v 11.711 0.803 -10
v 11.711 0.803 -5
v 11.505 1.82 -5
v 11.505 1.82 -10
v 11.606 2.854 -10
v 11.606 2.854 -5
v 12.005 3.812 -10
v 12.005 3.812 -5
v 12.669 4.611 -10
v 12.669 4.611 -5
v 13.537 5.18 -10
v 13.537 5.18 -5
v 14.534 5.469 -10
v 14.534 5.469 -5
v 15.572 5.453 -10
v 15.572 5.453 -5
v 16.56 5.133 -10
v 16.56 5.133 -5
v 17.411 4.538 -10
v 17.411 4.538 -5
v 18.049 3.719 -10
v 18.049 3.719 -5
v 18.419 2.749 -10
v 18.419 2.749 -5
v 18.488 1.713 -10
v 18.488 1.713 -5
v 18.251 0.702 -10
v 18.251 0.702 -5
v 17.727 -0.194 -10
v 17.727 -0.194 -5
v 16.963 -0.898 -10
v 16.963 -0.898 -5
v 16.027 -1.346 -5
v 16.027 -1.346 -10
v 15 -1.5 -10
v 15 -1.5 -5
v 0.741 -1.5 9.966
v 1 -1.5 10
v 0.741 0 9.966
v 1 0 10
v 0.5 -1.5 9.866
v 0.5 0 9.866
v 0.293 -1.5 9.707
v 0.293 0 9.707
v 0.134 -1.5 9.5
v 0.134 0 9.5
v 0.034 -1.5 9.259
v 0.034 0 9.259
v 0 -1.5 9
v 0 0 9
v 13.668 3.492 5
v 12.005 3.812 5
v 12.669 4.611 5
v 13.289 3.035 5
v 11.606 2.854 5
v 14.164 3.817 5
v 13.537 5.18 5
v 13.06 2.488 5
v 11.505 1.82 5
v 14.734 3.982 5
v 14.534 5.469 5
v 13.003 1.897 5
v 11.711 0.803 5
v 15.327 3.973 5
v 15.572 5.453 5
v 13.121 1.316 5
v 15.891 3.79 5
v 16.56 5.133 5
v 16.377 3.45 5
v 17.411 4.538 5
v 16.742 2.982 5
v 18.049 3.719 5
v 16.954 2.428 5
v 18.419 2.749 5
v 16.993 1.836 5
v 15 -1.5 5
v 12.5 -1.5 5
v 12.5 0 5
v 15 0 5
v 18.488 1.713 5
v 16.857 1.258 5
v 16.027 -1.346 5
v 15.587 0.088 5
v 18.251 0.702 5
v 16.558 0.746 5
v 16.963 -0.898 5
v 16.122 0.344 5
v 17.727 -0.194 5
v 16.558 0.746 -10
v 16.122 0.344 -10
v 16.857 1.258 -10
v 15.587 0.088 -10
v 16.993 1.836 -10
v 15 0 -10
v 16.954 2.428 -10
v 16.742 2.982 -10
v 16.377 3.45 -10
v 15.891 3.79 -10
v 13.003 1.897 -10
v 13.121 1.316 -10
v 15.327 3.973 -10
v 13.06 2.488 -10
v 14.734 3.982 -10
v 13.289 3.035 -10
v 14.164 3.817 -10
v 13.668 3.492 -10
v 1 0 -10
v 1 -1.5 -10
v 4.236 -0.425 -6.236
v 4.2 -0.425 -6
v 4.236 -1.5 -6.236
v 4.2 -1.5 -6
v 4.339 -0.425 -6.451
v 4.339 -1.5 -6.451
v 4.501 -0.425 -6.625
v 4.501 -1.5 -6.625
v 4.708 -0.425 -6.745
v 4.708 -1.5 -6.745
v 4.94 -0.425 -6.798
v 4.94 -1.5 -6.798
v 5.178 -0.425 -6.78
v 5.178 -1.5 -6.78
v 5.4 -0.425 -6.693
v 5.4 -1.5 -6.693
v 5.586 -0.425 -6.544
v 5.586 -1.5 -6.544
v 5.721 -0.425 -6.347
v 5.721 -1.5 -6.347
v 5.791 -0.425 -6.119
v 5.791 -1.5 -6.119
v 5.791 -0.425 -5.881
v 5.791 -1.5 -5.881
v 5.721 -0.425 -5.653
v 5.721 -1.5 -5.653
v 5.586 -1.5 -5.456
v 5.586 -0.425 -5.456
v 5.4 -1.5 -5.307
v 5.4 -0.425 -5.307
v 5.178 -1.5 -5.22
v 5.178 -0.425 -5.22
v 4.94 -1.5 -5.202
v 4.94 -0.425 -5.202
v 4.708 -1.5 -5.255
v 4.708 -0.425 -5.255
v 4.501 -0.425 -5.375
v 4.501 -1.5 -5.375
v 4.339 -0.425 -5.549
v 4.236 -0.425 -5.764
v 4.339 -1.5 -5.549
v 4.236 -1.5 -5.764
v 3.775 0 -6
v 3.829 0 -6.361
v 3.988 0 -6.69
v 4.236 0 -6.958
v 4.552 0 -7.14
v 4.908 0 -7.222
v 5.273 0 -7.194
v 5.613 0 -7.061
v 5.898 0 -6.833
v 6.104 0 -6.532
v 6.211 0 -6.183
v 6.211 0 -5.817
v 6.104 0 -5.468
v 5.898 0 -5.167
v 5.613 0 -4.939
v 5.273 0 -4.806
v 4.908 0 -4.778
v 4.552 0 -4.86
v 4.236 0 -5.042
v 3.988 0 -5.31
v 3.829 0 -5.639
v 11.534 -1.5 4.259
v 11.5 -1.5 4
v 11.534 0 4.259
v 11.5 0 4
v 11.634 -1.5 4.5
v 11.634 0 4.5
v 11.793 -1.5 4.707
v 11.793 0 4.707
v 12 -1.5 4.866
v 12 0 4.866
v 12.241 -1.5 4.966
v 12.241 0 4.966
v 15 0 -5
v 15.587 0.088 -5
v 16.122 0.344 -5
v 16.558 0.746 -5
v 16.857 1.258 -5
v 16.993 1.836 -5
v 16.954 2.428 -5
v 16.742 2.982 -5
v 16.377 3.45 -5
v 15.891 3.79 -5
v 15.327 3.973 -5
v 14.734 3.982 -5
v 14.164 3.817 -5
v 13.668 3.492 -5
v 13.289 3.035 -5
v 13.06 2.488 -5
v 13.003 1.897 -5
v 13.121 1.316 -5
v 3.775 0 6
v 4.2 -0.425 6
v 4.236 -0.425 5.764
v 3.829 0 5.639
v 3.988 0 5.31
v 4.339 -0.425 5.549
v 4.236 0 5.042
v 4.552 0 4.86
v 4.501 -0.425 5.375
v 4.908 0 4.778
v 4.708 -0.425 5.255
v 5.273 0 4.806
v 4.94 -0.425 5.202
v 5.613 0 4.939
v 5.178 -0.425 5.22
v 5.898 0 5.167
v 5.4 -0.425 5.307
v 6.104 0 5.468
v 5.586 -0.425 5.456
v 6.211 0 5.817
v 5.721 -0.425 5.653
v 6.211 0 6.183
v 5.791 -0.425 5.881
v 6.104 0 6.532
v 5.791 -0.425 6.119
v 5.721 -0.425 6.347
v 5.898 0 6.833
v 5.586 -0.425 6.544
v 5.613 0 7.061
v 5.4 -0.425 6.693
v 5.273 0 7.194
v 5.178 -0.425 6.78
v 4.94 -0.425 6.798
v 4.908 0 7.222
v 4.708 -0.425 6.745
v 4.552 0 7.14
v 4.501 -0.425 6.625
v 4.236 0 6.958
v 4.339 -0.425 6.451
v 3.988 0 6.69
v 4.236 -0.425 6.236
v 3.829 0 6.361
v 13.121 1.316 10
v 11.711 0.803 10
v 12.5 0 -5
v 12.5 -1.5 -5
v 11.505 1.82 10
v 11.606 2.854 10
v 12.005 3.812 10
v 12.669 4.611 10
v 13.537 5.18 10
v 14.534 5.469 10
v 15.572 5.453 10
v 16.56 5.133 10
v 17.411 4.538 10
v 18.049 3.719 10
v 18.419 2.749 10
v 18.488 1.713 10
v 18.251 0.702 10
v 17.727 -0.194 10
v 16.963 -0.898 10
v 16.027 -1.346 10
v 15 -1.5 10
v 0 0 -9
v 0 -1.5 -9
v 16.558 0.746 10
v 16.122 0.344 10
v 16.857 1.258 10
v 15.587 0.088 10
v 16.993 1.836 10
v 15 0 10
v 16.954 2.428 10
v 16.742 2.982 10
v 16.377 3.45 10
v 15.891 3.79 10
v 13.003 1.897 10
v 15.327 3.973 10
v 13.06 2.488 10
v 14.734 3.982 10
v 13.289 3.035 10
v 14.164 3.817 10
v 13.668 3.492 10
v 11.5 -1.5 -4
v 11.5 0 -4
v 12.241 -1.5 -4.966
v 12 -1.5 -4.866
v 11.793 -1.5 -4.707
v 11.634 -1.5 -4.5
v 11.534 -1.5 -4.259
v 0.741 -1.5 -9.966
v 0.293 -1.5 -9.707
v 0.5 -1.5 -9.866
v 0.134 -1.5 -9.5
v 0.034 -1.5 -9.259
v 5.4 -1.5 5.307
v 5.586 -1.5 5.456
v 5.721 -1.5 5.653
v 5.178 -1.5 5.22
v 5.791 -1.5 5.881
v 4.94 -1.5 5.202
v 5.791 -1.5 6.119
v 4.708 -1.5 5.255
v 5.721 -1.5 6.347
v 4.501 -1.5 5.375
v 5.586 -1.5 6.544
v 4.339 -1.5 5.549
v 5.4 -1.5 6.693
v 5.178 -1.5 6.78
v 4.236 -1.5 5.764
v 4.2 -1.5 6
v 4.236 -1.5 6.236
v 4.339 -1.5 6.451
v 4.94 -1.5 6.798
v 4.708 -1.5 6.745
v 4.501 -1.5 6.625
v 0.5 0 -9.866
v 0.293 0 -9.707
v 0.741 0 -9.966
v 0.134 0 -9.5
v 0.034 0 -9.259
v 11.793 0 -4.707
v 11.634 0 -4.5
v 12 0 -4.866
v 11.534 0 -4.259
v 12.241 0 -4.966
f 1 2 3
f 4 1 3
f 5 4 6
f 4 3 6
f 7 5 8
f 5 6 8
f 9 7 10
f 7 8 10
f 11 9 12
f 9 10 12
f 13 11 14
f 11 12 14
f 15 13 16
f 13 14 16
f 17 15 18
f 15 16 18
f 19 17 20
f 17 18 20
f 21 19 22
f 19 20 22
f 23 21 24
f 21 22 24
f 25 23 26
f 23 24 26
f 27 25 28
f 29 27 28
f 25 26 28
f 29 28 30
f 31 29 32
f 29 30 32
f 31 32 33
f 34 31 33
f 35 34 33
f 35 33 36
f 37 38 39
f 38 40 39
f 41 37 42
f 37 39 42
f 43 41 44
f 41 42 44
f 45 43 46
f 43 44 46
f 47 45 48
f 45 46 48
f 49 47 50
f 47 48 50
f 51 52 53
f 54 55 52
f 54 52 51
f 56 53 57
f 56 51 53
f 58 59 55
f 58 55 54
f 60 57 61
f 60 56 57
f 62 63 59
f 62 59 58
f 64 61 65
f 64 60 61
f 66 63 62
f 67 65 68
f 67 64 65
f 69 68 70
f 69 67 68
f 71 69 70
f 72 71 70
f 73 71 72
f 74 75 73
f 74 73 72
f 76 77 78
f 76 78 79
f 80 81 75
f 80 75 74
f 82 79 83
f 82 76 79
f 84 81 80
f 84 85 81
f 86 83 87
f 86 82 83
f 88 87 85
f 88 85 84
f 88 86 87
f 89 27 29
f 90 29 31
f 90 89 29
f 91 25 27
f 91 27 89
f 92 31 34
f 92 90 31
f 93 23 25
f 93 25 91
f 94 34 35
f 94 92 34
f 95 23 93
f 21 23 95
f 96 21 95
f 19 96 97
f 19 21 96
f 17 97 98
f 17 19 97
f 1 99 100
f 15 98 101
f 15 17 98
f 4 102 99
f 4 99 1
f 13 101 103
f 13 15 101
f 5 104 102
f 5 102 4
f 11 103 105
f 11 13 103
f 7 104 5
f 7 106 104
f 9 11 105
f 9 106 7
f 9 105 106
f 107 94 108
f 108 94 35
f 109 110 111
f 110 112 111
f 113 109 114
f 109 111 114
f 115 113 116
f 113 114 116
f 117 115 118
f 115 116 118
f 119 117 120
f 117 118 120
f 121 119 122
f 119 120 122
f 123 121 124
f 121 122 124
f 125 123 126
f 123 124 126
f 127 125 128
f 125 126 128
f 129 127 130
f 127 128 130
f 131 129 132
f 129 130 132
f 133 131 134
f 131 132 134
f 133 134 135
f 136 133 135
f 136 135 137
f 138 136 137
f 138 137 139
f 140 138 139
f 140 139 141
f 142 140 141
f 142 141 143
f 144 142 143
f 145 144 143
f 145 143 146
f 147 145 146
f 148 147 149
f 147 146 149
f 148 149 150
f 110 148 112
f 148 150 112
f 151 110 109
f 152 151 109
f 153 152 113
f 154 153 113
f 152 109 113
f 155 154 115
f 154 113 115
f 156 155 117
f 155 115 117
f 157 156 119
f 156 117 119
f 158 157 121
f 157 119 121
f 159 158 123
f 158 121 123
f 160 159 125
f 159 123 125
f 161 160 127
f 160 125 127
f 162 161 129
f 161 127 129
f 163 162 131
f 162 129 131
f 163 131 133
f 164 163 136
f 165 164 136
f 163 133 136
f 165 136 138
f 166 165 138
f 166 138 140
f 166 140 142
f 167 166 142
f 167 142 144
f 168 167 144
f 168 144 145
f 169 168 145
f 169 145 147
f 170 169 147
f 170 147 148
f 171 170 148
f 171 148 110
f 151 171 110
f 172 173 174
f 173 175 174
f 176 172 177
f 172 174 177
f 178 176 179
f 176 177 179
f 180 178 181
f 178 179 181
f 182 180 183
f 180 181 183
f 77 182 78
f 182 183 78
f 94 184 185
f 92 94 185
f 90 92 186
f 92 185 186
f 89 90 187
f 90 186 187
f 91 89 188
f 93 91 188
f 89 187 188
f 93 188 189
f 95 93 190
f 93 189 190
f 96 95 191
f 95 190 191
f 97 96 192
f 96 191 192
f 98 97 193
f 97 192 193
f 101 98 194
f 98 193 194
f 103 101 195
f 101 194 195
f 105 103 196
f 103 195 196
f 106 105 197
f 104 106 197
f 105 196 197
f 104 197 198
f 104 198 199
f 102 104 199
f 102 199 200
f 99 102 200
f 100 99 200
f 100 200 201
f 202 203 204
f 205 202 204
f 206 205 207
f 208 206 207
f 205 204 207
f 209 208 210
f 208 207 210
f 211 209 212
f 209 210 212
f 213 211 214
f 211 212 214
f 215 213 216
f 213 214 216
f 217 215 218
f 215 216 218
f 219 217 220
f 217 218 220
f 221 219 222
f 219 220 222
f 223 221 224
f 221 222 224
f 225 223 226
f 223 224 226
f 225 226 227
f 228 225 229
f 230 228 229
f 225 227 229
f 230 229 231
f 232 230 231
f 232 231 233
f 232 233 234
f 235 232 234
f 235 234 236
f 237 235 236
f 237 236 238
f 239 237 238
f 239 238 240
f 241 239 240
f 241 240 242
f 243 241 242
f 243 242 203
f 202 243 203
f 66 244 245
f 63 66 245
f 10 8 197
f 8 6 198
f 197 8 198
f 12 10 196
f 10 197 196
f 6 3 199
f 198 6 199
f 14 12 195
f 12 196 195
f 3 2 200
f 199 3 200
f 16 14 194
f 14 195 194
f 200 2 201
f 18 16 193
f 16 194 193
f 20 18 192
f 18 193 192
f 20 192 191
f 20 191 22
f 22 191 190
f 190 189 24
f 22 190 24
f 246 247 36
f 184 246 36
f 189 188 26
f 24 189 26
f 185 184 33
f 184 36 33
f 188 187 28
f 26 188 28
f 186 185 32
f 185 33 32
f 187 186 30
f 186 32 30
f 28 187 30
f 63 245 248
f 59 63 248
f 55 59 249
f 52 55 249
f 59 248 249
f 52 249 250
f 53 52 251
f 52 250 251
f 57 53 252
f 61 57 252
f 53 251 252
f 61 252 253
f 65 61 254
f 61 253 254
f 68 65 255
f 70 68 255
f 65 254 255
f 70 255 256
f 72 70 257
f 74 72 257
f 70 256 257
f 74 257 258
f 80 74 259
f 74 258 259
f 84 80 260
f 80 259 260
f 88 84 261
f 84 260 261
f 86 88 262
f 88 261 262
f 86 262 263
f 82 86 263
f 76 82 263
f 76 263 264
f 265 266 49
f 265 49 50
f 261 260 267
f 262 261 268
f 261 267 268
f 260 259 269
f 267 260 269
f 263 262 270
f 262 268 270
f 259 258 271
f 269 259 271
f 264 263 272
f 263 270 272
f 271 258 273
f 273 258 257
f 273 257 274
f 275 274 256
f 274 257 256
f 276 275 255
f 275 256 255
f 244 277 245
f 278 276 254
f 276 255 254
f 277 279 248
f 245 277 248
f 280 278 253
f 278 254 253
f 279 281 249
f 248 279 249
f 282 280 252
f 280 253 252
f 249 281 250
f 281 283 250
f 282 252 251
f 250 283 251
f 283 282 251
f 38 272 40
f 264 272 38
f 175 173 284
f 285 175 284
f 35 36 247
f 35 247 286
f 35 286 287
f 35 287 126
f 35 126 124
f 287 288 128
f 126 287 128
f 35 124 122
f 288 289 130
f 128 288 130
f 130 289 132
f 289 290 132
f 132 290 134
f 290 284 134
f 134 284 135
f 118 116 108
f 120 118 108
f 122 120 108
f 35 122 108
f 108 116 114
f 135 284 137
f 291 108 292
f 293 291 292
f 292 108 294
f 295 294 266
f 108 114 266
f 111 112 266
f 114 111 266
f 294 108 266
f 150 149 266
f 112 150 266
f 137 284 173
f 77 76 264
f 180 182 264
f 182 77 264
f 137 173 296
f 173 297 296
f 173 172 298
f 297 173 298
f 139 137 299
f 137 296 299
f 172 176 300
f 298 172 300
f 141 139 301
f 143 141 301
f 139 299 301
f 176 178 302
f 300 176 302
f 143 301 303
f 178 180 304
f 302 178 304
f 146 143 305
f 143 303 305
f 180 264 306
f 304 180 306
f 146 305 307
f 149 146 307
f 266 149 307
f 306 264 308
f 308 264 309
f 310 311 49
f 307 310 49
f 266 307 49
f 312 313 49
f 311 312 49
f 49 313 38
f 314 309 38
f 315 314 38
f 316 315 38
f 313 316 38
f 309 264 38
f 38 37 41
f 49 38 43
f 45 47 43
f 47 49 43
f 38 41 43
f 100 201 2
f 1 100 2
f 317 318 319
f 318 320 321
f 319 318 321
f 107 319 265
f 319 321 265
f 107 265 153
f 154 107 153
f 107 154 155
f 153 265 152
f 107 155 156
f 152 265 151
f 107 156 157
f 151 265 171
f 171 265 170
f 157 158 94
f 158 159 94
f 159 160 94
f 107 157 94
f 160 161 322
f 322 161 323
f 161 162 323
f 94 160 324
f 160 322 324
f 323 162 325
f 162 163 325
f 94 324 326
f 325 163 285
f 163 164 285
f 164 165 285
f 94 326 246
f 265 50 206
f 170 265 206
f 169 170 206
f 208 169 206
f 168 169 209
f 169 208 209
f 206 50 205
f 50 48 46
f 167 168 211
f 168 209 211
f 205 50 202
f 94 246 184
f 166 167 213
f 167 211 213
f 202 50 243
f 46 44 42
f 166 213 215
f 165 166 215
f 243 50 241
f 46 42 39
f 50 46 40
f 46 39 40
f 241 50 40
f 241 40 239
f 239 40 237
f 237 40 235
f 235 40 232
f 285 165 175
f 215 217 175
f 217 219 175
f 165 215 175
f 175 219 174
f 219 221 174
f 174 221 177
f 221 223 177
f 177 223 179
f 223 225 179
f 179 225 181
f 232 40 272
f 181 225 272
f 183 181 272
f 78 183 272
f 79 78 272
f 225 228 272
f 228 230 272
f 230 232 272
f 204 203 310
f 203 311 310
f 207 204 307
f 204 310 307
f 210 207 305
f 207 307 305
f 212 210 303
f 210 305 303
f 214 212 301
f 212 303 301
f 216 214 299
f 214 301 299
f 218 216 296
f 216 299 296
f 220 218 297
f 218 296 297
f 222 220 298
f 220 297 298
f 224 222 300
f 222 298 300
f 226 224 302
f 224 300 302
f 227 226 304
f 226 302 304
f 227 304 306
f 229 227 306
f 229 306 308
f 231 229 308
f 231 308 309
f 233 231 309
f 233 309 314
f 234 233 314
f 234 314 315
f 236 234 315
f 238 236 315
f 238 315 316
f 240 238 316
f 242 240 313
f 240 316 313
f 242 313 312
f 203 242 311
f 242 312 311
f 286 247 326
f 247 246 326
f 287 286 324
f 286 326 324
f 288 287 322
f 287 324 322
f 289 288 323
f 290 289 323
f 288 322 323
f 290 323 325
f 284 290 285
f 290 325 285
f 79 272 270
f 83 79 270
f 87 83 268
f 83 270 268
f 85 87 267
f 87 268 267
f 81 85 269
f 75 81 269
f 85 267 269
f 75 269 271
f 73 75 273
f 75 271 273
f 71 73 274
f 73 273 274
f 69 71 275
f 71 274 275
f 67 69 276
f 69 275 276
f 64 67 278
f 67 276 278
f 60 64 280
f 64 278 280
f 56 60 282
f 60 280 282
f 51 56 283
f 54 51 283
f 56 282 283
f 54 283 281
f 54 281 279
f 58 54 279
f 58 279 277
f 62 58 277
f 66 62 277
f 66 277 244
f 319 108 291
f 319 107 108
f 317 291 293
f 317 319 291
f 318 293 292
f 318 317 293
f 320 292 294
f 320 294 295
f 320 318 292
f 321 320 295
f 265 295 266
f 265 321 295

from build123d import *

# Parameters (mm, degrees)
BASE_FLANGE1_DEPTH              = 10
CUT_EXTRUDE1_DEPTH              = 22.737065119
CUT_EXTRUDE1_DEPTH_BACK         = 22.737065119
SKETCH6_W                       = 7
SKETCH6_H                       = 10
FILLET1_R                       = 1
M2X0_4_TAPPED_HOLE1_D           = 1.6
M2X0_4_TAPPED_HOLE1_CSINK_D     = 2.45
M2X0_4_TAPPED_HOLE1_CSINK_ANGLE = 90


# Sheet-metal steps are written as plain solids
with BuildPart() as part:
    # Sketch1 → Base-Flange1 (new, symmetric)
    with BuildSketch(Plane.XY):
        with BuildLine():
            Line((0, 0), (15, 0))
            ThreePointArc((15, 0), (16.147152873, 3.638304089), (13.120614758, 1.315959713))
            Line((13.120614758, 1.315959713), (11.711075827, 0.802929498))
            ThreePointArc((11.711075827, 0.802929498), (17.007517527, 4.867032155), (15, -1.5))
            Line((15, -1.5), (0, -1.5))
            Line((0, -1.5), (0, 0))
        make_face()
    extrude(amount=BASE_FLANGE1_DEPTH, both=True)

    # Sketch6 → Cut-Extrude1 (cut, two sides: drawn at the far end of the back side and taken through both)
    with BuildSketch(Plane(origin=(0, 0, 0), x_dir=(1, 0, 0), z_dir=(0, 1, 0)).offset(-CUT_EXTRUDE1_DEPTH_BACK)):
        with Locations((15, 0)):
            Rectangle(SKETCH6_W, SKETCH6_H)
    extrude(amount=CUT_EXTRUDE1_DEPTH + CUT_EXTRUDE1_DEPTH_BACK, mode=Mode.SUBTRACT)

    # Fillet1
    fillet1_edges = [part.edges().sort_by_distance(p)[0] for p in [
        (0, -0.75, 10),
        (11.5, -0.75, -5),
        (11.5, -0.75, 5),
        (0, -0.75, -10),
    ]]
    fillet(fillet1_edges, radius=FILLET1_R)

    # M2x0.4 Tapped Hole1 (through all)
    with Locations(Plane(origin=(0, 0, 0), x_dir=(1, 0, 0), z_dir=(0, 1, 0))):
        with Locations((5, 6), (5, -6)):
            CounterSinkHole(M2X0_4_TAPPED_HOLE1_D / 2, M2X0_4_TAPPED_HOLE1_CSINK_D / 2, counter_sink_angle=M2X0_4_TAPPED_HOLE1_CSINK_ANGLE)


solid = part.part
